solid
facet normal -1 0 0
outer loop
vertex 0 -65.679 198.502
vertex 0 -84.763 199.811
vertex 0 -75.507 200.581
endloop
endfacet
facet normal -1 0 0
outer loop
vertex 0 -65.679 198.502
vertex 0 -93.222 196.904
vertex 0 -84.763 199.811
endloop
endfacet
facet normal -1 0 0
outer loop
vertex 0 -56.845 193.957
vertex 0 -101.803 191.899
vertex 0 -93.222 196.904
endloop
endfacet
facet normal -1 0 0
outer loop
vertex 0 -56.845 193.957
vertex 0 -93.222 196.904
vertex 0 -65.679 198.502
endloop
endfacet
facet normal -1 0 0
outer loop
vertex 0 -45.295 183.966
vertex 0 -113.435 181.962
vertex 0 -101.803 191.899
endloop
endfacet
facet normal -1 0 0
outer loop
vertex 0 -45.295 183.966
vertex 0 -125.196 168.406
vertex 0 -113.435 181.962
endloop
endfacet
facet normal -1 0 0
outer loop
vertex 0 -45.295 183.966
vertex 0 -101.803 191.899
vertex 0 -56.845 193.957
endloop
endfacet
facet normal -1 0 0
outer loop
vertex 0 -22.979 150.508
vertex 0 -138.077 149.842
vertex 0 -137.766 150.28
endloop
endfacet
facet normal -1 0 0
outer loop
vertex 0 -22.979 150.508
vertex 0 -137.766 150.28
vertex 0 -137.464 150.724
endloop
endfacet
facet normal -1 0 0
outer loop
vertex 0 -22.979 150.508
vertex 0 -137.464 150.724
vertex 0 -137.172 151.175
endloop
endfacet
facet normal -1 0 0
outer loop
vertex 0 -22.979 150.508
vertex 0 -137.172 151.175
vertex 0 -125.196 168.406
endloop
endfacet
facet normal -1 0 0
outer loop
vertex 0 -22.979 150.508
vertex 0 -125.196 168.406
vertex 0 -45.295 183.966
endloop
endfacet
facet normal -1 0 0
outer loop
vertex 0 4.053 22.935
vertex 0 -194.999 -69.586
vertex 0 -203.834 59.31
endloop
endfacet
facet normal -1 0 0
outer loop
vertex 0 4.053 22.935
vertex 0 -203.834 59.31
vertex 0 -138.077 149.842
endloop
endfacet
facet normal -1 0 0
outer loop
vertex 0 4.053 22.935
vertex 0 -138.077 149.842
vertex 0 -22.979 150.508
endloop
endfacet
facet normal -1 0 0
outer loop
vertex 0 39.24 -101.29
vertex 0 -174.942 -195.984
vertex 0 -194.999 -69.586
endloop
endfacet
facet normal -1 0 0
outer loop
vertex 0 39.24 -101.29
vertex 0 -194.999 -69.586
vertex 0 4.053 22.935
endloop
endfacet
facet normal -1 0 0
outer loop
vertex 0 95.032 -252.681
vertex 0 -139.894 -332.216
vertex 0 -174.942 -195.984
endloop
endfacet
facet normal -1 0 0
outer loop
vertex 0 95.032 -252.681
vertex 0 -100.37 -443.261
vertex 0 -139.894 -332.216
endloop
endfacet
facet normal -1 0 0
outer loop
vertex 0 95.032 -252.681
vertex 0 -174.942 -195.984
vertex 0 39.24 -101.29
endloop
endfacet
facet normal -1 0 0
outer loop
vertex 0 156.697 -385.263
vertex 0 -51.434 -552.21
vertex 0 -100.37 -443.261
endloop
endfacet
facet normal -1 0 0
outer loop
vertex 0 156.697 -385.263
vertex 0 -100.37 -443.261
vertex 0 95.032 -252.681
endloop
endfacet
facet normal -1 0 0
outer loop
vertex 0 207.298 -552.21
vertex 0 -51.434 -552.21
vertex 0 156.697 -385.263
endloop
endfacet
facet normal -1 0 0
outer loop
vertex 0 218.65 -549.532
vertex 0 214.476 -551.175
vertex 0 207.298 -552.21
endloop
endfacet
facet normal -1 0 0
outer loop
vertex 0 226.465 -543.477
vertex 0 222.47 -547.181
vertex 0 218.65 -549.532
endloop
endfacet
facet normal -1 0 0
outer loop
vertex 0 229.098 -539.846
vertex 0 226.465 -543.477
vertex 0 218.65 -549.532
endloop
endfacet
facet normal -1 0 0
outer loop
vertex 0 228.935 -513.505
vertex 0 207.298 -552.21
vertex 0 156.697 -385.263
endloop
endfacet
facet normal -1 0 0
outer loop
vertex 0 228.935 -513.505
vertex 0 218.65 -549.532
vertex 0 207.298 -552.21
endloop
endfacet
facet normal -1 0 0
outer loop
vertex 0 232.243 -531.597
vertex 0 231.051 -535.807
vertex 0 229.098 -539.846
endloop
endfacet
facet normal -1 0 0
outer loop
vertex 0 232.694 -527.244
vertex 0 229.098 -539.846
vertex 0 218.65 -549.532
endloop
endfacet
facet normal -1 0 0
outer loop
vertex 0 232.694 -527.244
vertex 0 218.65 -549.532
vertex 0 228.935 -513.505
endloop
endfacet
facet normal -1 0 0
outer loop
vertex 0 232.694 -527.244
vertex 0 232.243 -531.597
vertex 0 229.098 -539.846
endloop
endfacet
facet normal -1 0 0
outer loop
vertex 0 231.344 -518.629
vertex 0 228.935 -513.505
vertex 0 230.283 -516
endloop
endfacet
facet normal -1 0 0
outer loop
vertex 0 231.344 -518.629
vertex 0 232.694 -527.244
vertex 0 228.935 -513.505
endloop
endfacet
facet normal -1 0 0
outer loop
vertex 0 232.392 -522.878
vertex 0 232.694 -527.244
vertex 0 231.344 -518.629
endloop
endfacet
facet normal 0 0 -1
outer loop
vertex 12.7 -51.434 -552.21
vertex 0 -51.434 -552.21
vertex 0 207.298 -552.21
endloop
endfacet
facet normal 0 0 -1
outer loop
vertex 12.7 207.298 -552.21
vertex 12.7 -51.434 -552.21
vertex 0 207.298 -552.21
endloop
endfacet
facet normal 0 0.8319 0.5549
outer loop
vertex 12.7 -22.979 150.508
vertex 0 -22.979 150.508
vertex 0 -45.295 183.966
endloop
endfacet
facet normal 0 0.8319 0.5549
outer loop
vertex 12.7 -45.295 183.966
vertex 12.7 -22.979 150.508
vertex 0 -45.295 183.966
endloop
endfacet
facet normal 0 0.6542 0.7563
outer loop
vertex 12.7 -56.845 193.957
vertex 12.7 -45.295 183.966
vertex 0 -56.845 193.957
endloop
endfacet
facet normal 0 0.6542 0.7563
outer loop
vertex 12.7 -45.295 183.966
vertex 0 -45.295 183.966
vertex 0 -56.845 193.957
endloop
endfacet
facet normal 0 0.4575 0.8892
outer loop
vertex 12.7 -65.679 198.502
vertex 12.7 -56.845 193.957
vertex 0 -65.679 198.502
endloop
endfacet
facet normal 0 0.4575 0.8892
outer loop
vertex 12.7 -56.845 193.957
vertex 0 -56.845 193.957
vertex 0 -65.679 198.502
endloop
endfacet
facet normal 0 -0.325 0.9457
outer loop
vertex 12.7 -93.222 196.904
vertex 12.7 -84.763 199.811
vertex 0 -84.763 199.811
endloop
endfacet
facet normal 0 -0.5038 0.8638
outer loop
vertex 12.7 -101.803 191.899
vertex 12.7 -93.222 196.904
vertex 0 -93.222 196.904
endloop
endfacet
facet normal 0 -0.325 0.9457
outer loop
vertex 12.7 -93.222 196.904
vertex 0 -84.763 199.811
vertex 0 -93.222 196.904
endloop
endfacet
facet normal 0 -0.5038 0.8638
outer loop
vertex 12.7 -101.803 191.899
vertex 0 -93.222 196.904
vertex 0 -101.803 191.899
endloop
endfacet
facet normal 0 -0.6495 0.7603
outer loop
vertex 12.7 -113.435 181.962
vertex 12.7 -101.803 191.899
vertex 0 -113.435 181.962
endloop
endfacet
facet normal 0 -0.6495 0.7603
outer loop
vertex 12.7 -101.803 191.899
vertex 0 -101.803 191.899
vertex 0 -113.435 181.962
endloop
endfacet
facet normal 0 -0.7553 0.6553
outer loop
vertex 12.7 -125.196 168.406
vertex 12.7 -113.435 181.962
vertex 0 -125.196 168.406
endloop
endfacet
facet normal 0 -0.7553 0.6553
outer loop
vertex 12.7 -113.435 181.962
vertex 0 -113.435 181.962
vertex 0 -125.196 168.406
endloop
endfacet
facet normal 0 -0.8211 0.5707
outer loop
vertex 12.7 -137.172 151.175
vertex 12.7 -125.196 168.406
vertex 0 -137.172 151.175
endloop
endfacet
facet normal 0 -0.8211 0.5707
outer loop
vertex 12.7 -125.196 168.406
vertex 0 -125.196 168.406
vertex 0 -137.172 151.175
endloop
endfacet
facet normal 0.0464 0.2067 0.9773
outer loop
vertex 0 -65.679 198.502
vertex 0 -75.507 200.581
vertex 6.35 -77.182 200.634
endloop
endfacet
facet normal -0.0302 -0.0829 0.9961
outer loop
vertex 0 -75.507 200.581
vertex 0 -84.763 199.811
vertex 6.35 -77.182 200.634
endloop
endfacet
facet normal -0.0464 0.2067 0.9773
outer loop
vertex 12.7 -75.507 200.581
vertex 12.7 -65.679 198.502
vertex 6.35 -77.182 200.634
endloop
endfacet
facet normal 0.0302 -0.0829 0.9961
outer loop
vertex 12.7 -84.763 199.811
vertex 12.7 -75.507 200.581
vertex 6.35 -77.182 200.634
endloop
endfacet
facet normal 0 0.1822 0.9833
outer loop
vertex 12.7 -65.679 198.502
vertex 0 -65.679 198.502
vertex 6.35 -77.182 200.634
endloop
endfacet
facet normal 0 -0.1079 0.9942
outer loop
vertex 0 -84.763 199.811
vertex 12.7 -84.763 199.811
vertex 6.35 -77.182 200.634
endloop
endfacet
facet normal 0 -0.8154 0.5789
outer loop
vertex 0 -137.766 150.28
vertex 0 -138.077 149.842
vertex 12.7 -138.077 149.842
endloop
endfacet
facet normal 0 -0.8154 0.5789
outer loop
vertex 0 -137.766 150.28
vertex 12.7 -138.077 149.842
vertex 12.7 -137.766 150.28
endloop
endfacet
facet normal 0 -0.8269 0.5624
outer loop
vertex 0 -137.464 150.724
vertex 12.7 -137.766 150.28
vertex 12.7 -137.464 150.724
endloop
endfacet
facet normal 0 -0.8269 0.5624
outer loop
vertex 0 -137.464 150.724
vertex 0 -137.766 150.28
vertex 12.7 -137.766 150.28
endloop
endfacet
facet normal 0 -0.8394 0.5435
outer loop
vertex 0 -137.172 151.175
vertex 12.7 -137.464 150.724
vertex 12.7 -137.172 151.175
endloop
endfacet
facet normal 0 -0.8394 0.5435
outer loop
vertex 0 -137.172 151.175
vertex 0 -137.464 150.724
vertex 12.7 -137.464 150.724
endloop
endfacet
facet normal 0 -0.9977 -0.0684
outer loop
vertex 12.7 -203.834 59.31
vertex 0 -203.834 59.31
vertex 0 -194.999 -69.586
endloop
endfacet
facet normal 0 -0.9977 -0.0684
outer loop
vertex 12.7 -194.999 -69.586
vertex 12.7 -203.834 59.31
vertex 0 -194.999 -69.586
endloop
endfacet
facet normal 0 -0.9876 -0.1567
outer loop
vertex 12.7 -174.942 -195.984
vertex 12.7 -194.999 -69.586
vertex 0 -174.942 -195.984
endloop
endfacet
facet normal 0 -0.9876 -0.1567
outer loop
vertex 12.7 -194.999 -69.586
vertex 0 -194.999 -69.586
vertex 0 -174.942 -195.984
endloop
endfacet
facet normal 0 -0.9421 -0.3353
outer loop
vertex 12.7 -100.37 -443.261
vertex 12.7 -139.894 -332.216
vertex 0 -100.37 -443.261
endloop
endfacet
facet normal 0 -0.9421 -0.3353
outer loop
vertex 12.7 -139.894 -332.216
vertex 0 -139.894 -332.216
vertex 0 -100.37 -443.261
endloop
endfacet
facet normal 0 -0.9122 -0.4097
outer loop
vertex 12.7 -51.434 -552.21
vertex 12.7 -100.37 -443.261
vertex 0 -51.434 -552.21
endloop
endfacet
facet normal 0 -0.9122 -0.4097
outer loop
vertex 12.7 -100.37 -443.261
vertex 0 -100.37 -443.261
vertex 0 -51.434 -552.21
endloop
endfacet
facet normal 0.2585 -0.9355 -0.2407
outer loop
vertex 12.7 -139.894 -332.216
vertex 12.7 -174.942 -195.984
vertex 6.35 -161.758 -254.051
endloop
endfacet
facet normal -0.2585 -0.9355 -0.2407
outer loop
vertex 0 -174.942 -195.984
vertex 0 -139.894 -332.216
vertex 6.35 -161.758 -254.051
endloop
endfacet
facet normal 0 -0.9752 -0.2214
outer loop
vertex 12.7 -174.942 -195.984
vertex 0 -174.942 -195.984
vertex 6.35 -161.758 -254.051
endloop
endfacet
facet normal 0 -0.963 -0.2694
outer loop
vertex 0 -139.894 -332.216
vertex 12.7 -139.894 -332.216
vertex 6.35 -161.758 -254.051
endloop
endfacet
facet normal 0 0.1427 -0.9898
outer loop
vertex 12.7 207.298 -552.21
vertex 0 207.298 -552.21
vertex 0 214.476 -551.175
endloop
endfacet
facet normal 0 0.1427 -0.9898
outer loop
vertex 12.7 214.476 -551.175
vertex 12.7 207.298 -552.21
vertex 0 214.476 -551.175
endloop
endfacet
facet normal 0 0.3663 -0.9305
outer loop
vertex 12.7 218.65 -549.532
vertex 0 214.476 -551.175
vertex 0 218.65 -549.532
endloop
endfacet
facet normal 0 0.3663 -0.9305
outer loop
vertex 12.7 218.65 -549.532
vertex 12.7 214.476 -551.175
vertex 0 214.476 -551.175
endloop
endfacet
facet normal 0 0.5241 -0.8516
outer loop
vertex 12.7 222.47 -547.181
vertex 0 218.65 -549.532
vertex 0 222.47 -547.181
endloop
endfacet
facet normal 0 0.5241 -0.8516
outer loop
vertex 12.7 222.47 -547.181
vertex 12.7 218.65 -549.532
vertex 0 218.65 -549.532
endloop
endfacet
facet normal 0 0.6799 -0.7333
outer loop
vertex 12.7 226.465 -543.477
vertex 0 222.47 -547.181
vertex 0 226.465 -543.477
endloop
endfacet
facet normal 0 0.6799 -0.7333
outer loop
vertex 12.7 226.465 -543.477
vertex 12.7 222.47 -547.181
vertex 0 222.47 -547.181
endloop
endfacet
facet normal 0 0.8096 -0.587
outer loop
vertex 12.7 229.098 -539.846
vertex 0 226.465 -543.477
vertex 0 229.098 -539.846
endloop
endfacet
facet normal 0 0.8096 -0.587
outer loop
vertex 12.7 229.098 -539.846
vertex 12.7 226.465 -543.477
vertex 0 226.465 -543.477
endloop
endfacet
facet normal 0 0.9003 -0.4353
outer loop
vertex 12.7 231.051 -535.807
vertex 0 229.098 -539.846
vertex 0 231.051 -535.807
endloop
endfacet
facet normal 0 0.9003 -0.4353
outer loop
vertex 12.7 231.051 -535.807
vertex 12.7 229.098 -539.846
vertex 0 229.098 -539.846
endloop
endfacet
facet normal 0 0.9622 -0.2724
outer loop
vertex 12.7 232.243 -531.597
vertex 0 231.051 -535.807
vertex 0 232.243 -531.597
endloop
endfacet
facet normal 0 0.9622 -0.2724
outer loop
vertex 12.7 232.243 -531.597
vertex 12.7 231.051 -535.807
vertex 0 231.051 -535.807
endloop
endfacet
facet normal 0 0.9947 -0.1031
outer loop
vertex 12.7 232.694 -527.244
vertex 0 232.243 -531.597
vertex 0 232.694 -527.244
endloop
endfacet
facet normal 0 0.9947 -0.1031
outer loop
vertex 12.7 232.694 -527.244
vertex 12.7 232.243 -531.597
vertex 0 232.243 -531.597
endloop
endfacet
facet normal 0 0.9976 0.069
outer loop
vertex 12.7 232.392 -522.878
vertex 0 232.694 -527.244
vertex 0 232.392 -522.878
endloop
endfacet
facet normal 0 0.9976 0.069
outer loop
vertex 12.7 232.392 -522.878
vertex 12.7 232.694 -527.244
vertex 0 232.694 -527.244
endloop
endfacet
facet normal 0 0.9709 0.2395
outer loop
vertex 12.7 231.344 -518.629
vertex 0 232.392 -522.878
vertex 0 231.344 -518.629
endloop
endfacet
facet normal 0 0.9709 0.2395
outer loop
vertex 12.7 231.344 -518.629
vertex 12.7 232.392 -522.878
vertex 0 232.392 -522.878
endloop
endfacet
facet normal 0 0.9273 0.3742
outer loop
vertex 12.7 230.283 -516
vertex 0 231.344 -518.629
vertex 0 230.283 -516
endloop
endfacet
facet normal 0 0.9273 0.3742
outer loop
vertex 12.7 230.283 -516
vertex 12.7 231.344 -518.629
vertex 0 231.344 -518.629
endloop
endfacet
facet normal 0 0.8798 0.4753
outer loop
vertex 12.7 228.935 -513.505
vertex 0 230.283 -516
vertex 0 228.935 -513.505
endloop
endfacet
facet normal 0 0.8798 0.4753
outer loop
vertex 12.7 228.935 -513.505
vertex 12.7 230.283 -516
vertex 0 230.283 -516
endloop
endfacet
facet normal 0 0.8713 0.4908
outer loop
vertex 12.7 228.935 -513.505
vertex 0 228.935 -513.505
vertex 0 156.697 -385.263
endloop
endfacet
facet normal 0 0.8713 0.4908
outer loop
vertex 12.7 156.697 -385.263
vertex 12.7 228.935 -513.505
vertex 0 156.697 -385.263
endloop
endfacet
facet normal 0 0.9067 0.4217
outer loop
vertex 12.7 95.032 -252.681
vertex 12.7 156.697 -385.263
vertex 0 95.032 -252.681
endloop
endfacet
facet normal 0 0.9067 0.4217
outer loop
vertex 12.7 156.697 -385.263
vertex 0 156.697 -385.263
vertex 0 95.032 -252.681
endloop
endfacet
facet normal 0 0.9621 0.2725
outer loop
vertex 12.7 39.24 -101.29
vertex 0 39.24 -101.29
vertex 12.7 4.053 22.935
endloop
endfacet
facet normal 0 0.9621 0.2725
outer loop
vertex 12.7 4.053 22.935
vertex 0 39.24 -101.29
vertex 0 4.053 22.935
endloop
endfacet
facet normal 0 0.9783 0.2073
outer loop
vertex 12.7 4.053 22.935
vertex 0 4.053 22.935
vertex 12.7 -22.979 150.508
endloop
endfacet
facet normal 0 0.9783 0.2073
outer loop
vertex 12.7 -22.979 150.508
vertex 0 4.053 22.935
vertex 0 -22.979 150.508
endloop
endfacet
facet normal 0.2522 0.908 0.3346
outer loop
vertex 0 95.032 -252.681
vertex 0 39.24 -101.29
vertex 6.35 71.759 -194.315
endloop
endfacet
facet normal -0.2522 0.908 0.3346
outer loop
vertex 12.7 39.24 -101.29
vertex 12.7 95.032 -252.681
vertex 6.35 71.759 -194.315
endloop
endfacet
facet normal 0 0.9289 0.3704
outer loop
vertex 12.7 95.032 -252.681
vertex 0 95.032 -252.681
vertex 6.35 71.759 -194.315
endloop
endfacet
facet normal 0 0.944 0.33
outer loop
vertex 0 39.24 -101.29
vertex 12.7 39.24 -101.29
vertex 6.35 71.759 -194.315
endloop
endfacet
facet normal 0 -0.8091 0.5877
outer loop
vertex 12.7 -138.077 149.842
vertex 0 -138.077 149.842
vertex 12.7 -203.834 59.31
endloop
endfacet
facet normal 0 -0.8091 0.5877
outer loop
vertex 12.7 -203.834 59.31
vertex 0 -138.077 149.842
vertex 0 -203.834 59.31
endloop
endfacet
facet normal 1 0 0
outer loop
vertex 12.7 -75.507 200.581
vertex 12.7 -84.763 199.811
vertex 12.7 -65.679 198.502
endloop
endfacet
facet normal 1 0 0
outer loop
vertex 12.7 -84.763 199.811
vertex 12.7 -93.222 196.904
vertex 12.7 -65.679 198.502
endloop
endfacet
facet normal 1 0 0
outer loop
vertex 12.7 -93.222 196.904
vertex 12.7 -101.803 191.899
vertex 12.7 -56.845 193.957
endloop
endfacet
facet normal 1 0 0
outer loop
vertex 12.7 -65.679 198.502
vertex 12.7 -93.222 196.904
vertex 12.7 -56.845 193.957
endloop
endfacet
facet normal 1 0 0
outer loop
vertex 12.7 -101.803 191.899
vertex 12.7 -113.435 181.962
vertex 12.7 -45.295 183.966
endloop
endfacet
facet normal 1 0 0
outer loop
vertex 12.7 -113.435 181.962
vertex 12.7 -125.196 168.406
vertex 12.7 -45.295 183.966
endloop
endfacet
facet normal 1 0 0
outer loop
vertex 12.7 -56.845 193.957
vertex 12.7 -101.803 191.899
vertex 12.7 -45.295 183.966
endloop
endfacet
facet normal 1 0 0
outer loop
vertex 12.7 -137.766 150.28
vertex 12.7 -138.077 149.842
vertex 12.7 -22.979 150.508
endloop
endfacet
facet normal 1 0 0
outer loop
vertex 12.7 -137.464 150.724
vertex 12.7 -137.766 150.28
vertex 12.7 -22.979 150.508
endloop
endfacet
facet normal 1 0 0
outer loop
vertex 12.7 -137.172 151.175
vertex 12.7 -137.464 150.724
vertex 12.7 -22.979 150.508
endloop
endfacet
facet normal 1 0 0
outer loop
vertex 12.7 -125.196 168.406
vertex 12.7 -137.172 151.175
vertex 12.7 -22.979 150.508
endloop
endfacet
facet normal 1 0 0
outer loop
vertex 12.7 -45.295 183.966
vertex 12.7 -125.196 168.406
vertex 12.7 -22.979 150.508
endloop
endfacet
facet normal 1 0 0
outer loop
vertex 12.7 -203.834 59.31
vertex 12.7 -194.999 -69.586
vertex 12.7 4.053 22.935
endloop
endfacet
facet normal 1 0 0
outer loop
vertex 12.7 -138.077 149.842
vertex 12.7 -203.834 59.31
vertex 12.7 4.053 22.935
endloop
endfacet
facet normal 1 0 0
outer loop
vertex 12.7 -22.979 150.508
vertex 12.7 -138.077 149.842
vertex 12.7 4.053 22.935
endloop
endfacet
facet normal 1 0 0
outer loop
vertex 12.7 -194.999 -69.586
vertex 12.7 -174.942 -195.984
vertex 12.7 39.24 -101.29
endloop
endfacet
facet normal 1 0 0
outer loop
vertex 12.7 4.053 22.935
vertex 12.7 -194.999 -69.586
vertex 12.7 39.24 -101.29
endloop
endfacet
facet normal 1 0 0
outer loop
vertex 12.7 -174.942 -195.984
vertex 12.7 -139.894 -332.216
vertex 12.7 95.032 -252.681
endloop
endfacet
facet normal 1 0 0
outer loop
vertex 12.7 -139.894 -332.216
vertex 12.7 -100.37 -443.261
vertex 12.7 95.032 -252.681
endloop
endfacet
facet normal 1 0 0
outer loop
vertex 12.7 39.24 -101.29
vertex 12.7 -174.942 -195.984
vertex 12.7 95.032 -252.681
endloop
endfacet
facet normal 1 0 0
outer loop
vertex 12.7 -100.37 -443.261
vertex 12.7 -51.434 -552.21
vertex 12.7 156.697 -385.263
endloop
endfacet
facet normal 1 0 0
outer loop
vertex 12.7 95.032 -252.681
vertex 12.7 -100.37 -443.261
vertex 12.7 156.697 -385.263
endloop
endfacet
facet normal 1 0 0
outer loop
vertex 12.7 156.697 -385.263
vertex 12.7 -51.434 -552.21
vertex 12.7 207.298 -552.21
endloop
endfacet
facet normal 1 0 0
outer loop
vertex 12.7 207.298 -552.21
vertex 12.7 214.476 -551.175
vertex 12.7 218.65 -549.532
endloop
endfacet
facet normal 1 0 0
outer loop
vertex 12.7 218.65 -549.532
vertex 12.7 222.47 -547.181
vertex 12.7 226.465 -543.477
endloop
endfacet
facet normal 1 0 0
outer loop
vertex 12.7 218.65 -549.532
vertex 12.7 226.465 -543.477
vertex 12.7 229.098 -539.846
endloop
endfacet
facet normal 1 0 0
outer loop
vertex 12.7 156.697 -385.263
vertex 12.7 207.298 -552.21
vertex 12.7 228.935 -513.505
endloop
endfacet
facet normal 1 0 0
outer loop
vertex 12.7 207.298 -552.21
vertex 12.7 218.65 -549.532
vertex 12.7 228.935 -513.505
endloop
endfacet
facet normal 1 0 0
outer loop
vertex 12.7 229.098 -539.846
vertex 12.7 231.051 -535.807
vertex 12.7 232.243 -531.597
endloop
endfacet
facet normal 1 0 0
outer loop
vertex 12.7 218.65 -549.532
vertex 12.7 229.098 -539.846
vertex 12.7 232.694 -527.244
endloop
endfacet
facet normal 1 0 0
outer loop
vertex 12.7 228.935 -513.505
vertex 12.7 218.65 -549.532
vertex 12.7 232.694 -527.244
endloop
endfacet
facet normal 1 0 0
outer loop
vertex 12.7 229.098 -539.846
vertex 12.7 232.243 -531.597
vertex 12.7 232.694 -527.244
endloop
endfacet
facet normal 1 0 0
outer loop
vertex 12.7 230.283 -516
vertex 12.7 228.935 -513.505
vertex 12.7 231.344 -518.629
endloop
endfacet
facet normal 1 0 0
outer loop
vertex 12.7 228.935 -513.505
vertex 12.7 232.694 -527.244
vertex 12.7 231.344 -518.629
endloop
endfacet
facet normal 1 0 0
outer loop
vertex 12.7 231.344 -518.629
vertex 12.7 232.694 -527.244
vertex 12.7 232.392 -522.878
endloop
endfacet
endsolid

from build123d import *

# Parameters (mm, degrees)
BOSS_EXTRUDE1_DEPTH = 12.7
FILLET1_R           = 25.4
FILLET2_R           = 25.4


with BuildPart() as part:
    # Sketch1 → Boss-Extrude1 (new body)
    with BuildSketch(Plane(origin=(0, 0, 0), x_dir=(0, 0, -1), z_dir=(1, 0, 0))):
        with BuildLine():
            Line((552.210156901, -51.434482431), (552.210156901, 253.365517569))
            add(Edge.make_bspline(
                [(552.210156901, 253.365517569), (229.842048286, 44.573189665), (-150.507944751, -22.97883784)],
                knots=[0, 0, 0, 1, 1, 1], degree=2))
            add(Edge.make_bspline(
                [(-150.507944751, -22.97883784), (-250.760296622, -74.460252601), (-150.507944751, -137.593021529)],
                knots=[0, 0, 0, 1, 1, 1], degree=2))
            Line((-150.507944751, -137.593021529), (-59.310339097, -203.834480101))
            add(Edge.make_bspline(
                [(-59.310339097, -203.834480101), (261.653002312, -195.881315467), (552.210156901, -51.434482431)],
                knots=[0, 0, 0, 1, 1, 1], degree=2))
        make_face()
    extrude(amount=BOSS_EXTRUDE1_DEPTH)

    # Fillet1
    fillet1_edges = [part.edges().sort_by_distance(p)[0] for p in [
        (6.35, 253.365517569, -552.210156901),
    ]]
    fillet(fillet1_edges, radius=FILLET1_R)

    # Fillet2
    # the kernel refuses this fillet: 25.4 mm, written as the material it adds along each edge
    with BuildSketch(Plane(origin=(0, -137.593021529, 150.507944751), x_dir=(0, -0.5876837443751272, -0.8090907344650724), z_dir=(1, 0, 0))) as fillet2_piece_1:
        with BuildLine():
            CenterArc((0.823180345, -25.4), FILLET2_R, 90, 3.635270522)
            ThreePointArc((-0.787303597, -0.051107687), (-0.393634255, -0.025824092), (0, 0))
            Line((0, 0), (0.823180345, 0))
        make_face()
    extrude(amount=12.7)


solid = part.part
